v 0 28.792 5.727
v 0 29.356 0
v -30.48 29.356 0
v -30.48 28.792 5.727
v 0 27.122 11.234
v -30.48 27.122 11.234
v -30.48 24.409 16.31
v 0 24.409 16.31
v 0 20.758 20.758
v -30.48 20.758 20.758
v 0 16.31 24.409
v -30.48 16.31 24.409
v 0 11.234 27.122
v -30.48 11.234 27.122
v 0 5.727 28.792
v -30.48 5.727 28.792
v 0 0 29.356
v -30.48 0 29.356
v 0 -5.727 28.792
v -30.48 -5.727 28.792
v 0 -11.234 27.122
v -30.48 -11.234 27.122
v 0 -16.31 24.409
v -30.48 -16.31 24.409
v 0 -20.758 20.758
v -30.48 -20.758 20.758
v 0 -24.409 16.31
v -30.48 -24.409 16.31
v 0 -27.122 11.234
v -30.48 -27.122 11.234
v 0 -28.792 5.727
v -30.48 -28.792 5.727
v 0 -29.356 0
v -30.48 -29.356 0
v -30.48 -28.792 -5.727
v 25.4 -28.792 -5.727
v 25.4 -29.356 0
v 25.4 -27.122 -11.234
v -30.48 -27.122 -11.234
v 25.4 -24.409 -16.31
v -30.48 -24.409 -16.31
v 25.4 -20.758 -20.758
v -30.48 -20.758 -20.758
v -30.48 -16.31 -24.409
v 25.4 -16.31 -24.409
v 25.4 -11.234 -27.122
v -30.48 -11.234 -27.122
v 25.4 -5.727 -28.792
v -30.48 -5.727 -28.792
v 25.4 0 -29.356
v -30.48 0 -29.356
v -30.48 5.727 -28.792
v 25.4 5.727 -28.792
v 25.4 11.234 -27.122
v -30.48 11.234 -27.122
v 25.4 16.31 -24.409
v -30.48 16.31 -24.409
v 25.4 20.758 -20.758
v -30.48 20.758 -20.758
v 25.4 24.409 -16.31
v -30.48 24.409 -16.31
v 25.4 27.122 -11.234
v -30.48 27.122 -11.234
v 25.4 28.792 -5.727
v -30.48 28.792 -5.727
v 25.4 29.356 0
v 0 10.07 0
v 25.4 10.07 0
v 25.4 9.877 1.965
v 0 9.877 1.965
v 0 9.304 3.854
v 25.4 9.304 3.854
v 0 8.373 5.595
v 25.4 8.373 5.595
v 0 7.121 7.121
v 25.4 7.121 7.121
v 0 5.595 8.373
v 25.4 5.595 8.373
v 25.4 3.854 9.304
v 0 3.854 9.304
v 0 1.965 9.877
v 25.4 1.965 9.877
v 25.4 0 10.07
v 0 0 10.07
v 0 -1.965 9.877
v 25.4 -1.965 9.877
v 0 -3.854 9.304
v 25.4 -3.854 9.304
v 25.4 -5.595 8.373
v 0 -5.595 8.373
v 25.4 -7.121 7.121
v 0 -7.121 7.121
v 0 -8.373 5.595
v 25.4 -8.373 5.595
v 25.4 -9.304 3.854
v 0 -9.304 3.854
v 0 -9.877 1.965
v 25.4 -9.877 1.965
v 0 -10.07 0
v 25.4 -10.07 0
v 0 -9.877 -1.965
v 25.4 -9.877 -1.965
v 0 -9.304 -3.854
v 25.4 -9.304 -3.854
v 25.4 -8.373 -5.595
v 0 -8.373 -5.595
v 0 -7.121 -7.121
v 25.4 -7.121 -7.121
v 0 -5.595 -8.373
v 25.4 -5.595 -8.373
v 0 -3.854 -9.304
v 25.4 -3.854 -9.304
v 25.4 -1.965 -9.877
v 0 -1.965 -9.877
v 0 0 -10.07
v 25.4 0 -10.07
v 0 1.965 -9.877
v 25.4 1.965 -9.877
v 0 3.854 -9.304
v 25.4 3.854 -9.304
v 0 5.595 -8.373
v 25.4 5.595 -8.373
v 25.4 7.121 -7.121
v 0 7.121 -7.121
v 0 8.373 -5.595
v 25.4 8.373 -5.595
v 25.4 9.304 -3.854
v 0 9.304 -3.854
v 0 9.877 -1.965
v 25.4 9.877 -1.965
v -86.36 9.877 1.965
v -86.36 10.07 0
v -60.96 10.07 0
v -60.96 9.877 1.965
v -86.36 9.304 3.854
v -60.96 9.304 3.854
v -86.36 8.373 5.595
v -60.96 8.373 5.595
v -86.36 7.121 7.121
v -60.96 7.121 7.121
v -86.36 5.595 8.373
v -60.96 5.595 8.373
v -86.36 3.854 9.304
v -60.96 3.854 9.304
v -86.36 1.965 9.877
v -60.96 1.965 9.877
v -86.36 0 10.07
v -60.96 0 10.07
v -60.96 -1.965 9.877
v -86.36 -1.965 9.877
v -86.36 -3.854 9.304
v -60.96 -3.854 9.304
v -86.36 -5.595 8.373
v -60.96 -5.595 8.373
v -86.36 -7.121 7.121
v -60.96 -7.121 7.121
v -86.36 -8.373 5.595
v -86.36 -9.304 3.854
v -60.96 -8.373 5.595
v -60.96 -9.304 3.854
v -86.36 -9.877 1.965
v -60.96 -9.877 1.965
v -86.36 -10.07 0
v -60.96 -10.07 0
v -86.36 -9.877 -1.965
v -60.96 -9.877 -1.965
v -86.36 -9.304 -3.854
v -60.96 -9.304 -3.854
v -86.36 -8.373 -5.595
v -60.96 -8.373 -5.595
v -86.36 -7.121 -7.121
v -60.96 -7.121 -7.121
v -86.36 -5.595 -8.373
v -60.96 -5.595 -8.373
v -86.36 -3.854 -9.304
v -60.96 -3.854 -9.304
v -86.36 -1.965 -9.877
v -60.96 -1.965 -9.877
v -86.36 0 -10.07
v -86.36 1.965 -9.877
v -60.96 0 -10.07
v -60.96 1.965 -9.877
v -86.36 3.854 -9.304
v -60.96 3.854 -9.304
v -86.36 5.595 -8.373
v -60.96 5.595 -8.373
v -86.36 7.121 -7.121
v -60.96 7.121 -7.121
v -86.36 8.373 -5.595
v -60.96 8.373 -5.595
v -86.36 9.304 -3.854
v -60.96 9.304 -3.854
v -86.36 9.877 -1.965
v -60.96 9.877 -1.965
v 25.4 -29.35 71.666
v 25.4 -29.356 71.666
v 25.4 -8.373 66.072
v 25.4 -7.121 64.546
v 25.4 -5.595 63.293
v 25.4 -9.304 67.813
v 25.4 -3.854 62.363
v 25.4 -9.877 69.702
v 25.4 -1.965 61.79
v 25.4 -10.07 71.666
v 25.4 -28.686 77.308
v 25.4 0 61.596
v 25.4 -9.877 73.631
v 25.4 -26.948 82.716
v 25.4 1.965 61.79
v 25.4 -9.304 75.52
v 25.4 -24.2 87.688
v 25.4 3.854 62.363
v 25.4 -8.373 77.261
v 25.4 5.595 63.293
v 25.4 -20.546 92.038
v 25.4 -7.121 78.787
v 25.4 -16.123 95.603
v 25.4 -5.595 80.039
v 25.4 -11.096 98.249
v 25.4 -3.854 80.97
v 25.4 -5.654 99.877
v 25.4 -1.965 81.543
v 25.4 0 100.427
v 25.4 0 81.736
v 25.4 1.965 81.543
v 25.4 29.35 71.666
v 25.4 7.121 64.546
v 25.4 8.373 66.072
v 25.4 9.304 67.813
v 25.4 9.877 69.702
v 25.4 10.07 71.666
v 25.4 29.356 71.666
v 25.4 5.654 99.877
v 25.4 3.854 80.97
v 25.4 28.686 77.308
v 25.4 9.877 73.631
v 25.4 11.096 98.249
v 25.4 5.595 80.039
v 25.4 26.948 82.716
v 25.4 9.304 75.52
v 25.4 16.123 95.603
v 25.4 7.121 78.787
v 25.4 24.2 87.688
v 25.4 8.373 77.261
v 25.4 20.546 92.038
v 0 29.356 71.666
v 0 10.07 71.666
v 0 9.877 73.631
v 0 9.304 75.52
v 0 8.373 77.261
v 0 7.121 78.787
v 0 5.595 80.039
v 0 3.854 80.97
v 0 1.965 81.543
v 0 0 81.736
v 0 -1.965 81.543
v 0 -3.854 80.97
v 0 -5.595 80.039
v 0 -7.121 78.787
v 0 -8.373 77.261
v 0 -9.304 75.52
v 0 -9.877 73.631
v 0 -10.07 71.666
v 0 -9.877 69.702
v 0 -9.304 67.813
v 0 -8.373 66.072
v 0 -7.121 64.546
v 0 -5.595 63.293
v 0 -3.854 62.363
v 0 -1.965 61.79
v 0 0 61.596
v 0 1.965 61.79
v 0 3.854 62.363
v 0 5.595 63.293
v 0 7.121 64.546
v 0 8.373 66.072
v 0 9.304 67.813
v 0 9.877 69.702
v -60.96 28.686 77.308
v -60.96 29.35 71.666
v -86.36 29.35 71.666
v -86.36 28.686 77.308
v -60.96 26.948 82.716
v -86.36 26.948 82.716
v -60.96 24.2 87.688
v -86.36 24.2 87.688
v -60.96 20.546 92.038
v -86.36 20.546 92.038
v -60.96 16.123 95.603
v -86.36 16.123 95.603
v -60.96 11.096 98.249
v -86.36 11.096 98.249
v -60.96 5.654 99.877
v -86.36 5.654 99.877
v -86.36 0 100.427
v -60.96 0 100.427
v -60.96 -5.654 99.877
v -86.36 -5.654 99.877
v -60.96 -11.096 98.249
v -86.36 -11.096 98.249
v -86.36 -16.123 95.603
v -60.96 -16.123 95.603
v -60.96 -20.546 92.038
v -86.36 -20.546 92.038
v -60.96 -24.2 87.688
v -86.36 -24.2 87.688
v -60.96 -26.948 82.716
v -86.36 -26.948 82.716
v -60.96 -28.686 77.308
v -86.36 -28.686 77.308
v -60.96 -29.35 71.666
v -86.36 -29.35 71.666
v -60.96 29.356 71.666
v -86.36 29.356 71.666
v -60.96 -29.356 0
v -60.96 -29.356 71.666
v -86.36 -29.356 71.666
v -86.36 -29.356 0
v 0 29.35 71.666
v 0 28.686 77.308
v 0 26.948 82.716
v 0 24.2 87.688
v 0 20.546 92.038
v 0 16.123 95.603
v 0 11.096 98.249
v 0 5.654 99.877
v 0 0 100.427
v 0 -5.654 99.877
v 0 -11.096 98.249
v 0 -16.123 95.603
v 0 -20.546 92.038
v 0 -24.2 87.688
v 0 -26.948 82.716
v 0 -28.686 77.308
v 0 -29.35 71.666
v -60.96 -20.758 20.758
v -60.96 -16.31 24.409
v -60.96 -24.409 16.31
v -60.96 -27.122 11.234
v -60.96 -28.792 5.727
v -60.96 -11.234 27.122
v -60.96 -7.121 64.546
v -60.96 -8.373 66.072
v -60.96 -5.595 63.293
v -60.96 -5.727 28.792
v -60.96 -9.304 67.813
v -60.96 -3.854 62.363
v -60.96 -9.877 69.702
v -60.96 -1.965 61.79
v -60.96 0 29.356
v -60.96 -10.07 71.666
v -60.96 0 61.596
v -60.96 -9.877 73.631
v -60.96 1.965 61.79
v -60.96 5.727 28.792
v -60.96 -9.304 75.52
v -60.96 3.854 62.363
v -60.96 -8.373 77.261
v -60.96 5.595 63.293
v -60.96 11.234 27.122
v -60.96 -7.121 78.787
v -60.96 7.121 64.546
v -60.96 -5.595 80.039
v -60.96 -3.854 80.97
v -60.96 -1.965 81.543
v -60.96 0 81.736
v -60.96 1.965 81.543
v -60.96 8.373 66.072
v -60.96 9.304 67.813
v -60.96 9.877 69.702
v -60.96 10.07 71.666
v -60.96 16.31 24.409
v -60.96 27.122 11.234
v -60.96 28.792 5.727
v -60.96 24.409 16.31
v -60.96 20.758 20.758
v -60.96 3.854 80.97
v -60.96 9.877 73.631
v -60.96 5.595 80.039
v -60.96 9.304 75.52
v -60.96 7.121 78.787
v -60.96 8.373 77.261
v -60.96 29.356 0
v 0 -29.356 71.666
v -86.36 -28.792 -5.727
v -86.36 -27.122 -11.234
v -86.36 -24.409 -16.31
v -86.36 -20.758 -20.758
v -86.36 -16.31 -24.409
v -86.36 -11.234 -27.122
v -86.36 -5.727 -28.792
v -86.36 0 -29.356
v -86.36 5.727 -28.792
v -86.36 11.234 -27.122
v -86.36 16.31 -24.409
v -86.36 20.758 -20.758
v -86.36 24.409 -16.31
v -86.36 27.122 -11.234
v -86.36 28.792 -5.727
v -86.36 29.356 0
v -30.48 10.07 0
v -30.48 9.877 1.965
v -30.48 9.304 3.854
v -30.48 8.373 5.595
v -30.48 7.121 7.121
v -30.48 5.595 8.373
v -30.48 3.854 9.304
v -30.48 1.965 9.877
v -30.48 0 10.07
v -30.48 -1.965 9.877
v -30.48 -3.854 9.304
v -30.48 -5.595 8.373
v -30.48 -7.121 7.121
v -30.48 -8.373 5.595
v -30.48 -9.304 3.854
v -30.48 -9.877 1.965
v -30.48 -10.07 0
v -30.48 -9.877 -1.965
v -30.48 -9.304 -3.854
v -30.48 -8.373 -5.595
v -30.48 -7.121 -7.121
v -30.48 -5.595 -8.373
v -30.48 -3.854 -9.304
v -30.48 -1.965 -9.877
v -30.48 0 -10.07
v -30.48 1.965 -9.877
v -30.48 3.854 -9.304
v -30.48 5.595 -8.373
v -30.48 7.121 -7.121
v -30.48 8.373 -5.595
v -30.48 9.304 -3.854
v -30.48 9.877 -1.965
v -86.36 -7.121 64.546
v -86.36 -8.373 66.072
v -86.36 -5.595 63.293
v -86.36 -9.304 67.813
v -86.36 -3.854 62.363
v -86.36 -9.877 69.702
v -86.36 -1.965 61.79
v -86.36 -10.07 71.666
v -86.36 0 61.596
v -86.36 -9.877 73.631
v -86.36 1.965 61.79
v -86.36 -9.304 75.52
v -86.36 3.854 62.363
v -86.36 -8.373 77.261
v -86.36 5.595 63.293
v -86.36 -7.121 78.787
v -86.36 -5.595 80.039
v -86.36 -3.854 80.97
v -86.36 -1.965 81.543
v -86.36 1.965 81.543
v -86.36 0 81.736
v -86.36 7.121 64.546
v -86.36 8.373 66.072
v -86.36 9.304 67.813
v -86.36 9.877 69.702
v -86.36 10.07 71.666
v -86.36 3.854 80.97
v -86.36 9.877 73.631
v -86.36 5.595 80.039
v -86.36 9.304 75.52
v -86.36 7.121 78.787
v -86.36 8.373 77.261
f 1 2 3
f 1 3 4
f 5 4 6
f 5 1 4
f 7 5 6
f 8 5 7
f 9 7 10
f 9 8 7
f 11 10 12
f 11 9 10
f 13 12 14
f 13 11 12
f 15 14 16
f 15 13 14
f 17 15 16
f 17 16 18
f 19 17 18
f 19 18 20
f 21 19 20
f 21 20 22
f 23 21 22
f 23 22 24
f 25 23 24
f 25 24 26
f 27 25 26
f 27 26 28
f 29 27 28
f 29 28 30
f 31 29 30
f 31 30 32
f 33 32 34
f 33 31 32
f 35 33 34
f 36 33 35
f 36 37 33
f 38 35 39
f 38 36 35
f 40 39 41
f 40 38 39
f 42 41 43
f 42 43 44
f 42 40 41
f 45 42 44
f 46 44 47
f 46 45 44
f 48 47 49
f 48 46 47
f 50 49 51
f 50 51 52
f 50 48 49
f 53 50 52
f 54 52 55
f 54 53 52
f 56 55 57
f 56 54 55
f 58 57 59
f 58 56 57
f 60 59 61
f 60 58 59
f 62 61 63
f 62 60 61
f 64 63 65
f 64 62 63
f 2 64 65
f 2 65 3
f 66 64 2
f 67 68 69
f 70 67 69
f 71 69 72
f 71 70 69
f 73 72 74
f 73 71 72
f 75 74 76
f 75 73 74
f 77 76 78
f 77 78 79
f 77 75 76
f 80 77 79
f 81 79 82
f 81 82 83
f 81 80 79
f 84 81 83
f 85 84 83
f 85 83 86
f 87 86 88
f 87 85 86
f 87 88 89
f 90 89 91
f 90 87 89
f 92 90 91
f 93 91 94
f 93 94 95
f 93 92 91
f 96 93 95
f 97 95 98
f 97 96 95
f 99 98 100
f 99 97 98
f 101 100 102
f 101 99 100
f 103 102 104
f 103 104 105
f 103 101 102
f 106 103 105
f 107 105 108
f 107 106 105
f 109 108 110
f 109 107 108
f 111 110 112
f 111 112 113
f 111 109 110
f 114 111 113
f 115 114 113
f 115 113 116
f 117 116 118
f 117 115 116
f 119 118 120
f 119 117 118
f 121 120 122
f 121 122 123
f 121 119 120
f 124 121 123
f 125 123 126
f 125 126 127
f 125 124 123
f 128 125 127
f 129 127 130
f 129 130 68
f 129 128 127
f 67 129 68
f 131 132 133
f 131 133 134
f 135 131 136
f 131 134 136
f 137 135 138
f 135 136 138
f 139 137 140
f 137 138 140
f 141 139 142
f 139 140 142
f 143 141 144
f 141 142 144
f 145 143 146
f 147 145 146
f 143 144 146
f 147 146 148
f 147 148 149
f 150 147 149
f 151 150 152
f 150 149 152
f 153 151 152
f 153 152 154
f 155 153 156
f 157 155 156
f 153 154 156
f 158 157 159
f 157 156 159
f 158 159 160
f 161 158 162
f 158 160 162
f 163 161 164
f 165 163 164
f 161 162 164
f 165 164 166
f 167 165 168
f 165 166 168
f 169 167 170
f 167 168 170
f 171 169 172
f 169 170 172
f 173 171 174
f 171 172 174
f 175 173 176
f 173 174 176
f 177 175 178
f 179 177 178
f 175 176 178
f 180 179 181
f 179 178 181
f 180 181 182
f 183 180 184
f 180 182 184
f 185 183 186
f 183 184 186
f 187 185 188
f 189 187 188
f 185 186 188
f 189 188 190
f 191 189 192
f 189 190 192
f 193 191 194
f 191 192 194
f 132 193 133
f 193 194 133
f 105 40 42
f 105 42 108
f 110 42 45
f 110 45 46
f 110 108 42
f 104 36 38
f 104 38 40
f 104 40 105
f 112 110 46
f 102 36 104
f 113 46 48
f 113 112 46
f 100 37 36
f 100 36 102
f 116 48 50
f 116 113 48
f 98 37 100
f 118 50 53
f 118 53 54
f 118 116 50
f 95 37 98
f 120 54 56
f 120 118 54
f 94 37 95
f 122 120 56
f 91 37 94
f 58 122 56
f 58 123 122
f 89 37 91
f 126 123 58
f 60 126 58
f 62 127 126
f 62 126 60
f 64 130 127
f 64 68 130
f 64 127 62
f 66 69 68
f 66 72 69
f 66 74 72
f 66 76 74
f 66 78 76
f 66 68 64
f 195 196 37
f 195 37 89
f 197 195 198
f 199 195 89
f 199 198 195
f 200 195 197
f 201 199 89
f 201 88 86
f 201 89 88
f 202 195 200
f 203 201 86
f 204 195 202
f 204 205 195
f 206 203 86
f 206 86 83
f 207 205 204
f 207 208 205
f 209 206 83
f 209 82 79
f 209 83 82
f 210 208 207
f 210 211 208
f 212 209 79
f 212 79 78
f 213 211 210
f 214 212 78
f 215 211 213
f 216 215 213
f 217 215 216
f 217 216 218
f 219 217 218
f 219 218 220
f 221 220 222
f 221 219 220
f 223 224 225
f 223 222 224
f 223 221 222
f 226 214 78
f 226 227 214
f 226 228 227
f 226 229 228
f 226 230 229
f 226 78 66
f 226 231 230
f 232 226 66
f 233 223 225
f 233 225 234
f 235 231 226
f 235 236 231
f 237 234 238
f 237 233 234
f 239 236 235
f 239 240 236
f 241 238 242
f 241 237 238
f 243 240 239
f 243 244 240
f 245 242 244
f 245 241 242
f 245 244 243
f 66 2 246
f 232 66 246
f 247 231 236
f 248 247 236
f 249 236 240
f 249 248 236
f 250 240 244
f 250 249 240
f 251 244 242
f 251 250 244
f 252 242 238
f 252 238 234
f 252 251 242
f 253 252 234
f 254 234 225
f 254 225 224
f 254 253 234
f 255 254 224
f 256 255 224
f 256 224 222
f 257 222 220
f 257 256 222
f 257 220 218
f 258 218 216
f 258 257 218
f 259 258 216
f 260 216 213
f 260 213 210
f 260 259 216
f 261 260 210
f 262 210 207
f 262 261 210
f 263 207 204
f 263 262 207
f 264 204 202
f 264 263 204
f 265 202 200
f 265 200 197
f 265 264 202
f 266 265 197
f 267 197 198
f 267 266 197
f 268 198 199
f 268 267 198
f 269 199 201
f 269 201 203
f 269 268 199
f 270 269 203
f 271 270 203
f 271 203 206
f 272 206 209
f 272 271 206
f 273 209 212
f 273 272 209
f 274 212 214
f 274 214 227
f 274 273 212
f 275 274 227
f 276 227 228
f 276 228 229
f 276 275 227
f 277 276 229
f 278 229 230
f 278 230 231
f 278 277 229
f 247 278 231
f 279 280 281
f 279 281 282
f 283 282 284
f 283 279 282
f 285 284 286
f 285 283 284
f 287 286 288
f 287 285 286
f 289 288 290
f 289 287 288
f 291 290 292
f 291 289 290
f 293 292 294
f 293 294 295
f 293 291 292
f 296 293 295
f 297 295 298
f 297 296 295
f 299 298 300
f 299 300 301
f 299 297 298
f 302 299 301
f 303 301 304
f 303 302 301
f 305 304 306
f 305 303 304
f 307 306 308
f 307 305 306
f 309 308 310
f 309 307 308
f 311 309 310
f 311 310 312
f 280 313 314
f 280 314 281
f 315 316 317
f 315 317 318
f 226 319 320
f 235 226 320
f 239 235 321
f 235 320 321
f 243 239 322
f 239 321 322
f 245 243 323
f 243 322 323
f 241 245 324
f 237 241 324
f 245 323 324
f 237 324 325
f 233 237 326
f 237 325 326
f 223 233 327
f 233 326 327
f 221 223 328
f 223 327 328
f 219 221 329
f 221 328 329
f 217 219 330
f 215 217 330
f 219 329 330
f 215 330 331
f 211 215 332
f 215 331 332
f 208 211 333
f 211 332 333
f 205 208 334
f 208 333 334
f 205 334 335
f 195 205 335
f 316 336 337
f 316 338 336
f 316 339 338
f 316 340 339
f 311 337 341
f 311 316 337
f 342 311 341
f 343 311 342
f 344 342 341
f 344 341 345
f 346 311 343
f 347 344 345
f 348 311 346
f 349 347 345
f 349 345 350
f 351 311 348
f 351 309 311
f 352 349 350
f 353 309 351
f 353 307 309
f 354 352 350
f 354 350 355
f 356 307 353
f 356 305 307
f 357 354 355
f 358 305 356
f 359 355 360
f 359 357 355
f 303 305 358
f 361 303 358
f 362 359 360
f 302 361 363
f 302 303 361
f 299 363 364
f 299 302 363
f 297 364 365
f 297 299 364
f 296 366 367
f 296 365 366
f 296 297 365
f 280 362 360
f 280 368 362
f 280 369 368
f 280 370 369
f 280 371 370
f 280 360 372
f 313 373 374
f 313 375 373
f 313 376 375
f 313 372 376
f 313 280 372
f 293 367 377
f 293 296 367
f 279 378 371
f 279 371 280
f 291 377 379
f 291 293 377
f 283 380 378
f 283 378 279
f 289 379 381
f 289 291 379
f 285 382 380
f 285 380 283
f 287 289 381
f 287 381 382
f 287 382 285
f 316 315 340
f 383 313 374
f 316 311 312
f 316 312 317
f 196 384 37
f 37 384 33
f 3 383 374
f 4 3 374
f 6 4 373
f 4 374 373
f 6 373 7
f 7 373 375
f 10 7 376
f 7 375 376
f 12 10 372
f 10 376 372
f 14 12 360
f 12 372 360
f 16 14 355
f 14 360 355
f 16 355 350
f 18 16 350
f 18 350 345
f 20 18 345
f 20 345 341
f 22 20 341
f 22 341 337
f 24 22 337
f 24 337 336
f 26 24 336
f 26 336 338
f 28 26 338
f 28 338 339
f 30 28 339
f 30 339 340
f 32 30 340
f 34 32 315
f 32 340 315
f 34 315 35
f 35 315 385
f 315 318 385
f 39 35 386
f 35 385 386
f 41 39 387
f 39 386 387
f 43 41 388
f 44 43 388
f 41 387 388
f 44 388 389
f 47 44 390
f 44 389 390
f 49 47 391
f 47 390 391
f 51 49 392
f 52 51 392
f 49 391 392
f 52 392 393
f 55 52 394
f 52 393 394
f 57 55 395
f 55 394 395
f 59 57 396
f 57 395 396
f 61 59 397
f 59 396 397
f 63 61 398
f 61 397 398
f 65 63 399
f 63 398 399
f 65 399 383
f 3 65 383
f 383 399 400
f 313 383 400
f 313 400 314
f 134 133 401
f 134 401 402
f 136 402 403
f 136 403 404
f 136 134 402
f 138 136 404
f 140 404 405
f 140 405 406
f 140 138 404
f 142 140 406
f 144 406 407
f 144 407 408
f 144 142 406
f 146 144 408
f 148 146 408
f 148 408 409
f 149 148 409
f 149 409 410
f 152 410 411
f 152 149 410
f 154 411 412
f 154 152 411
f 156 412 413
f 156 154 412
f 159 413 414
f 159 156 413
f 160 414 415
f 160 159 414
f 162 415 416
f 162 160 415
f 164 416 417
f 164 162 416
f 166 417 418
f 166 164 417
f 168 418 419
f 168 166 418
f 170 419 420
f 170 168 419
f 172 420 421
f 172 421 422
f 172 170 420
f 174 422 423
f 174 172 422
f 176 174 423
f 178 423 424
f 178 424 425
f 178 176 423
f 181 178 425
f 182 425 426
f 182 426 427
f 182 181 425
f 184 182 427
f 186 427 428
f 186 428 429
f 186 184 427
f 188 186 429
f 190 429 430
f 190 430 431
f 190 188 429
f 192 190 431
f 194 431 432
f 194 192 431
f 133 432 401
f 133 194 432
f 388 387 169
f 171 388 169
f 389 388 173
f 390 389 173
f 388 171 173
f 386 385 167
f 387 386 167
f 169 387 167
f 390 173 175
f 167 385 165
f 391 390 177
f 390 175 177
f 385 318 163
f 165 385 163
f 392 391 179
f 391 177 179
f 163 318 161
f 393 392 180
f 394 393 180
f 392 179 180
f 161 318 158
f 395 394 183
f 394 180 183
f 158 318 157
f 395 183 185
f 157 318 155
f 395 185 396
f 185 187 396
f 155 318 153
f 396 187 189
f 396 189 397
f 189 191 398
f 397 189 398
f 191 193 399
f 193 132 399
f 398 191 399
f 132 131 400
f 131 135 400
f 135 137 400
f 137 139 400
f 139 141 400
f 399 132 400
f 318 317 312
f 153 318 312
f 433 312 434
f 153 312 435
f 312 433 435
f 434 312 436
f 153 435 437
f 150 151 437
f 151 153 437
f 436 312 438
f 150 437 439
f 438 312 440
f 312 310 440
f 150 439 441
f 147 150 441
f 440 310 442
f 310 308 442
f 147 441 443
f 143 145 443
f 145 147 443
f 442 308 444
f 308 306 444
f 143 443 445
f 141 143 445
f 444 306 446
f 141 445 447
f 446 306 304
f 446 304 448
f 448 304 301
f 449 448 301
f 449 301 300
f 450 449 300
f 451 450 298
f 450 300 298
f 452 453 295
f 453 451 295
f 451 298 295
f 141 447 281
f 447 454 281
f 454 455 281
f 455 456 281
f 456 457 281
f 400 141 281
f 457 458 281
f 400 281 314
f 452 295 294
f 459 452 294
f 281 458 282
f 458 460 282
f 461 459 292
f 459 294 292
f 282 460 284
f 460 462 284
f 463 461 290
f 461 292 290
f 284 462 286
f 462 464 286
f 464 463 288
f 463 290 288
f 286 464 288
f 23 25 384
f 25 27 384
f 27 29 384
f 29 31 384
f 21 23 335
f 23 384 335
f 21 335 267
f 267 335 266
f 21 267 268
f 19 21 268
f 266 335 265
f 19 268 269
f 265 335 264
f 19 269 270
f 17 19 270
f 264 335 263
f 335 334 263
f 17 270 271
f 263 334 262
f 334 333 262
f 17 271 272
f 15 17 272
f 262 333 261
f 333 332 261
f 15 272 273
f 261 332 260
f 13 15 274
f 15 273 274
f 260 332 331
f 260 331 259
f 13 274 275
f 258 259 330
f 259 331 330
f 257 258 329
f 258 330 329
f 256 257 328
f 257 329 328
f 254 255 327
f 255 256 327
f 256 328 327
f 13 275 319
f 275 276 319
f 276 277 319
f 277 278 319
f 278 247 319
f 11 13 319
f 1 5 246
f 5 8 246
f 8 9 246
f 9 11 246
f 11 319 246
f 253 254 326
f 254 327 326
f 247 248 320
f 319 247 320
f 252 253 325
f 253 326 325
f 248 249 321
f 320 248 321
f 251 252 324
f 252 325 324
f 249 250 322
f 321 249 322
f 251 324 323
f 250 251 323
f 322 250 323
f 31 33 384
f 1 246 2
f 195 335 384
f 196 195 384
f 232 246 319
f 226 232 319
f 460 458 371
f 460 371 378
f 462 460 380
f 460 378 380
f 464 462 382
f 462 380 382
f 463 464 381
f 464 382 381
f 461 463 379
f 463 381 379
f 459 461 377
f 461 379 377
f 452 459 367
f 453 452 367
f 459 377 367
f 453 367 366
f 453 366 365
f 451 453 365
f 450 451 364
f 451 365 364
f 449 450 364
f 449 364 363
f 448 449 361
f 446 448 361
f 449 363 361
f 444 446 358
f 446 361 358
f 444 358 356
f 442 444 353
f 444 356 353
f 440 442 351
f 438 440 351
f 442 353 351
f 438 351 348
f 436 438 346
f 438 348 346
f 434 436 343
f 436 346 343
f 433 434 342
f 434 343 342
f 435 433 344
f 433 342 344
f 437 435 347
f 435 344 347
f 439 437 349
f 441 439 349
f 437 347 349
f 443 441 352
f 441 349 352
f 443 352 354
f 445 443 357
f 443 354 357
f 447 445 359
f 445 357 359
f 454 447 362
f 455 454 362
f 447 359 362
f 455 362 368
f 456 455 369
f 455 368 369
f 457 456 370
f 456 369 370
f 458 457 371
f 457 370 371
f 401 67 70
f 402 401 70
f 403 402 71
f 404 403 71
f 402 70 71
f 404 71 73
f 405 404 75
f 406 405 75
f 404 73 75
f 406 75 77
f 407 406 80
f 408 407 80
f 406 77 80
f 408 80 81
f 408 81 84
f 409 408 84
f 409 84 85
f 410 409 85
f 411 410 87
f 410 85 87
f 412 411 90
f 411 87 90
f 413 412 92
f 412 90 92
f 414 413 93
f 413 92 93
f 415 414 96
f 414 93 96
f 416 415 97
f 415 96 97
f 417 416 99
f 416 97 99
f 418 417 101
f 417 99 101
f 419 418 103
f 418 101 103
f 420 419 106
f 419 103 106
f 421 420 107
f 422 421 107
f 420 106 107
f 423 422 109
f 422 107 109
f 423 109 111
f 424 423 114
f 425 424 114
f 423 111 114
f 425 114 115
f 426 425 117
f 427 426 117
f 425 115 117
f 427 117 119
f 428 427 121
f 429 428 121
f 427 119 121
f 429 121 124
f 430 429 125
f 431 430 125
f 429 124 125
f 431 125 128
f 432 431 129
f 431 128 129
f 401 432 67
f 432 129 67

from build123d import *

# Parameters (mm, degrees)
F0_R     = 10.070149
F1_DEPTH = 25.4
F2_DEPTH = 30.48


with BuildPart() as f1:
    # F0 (on Right) → F1 (new body)
    with BuildSketch(Plane.YZ):
        with BuildLine():
            ThreePointArc((-29.356436, 0), (0, -29.356436), (29.356436, 0))
            ThreePointArc((29.356436, 0), (0, 29.356436), (-29.356436, 0))
        make_face()
        Circle(F0_R, mode=Mode.SUBTRACT)
        with BuildLine():
            ThreePointArc((-29.356436, 0), (0, 29.356436), (29.356436, 0))
            Line((29.356436, 0), (29.356436, 71.070336))
            ThreePointArc((29.356436, 71.070336), (29.354923, 71.368341), (29.350386, 71.666315))
            ThreePointArc((29.350386, 71.666315), (0, 100.426772), (-29.350386, 71.666315))
            ThreePointArc((-29.350386, 71.666315), (-29.354923, 71.368341), (-29.356436, 71.070336))
            Line((-29.356436, 71.070336), (-29.356436, 0))
        make_face()
        with Locations((0, 71.666315)):
            Circle(F0_R, mode=Mode.SUBTRACT)
        with BuildLine():
            ThreePointArc((29.350386, 71.666315), (29.354923, 71.368341), (29.356436, 71.070336))
            Line((29.356436, 71.070336), (29.356436, 71.666315))
            Line((29.356436, 71.666315), (29.350386, 71.666315))
        make_face()
        with BuildLine():
            Line((-29.356436, 71.666315), (-29.356436, 71.070336))
            ThreePointArc((-29.356436, 71.070336), (-29.354923, 71.368341), (-29.350386, 71.666315))
            Line((-29.350386, 71.666315), (-29.356436, 71.666315))
        make_face()
    extrude(amount=F1_DEPTH)

    # F0 (on Right) → F2 (join)
    with BuildSketch(Plane.YZ):
        with BuildLine():
            ThreePointArc((-29.356436, 0), (0, -29.356436), (29.356436, 0))
            ThreePointArc((29.356436, 0), (0, 29.356436), (-29.356436, 0))
        make_face()
        Circle(F0_R, mode=Mode.SUBTRACT)
    extrude(amount=-F2_DEPTH)

    # F4: F1 across plane


with BuildPart() as f1_1:
    add(f1.part)
    add(f1.part.mirror(Plane(origin=(-30.48, 0, 0), x_dir=(0, 1, 0), z_dir=(-1, 0, 0))))


solid = f1_1.part
